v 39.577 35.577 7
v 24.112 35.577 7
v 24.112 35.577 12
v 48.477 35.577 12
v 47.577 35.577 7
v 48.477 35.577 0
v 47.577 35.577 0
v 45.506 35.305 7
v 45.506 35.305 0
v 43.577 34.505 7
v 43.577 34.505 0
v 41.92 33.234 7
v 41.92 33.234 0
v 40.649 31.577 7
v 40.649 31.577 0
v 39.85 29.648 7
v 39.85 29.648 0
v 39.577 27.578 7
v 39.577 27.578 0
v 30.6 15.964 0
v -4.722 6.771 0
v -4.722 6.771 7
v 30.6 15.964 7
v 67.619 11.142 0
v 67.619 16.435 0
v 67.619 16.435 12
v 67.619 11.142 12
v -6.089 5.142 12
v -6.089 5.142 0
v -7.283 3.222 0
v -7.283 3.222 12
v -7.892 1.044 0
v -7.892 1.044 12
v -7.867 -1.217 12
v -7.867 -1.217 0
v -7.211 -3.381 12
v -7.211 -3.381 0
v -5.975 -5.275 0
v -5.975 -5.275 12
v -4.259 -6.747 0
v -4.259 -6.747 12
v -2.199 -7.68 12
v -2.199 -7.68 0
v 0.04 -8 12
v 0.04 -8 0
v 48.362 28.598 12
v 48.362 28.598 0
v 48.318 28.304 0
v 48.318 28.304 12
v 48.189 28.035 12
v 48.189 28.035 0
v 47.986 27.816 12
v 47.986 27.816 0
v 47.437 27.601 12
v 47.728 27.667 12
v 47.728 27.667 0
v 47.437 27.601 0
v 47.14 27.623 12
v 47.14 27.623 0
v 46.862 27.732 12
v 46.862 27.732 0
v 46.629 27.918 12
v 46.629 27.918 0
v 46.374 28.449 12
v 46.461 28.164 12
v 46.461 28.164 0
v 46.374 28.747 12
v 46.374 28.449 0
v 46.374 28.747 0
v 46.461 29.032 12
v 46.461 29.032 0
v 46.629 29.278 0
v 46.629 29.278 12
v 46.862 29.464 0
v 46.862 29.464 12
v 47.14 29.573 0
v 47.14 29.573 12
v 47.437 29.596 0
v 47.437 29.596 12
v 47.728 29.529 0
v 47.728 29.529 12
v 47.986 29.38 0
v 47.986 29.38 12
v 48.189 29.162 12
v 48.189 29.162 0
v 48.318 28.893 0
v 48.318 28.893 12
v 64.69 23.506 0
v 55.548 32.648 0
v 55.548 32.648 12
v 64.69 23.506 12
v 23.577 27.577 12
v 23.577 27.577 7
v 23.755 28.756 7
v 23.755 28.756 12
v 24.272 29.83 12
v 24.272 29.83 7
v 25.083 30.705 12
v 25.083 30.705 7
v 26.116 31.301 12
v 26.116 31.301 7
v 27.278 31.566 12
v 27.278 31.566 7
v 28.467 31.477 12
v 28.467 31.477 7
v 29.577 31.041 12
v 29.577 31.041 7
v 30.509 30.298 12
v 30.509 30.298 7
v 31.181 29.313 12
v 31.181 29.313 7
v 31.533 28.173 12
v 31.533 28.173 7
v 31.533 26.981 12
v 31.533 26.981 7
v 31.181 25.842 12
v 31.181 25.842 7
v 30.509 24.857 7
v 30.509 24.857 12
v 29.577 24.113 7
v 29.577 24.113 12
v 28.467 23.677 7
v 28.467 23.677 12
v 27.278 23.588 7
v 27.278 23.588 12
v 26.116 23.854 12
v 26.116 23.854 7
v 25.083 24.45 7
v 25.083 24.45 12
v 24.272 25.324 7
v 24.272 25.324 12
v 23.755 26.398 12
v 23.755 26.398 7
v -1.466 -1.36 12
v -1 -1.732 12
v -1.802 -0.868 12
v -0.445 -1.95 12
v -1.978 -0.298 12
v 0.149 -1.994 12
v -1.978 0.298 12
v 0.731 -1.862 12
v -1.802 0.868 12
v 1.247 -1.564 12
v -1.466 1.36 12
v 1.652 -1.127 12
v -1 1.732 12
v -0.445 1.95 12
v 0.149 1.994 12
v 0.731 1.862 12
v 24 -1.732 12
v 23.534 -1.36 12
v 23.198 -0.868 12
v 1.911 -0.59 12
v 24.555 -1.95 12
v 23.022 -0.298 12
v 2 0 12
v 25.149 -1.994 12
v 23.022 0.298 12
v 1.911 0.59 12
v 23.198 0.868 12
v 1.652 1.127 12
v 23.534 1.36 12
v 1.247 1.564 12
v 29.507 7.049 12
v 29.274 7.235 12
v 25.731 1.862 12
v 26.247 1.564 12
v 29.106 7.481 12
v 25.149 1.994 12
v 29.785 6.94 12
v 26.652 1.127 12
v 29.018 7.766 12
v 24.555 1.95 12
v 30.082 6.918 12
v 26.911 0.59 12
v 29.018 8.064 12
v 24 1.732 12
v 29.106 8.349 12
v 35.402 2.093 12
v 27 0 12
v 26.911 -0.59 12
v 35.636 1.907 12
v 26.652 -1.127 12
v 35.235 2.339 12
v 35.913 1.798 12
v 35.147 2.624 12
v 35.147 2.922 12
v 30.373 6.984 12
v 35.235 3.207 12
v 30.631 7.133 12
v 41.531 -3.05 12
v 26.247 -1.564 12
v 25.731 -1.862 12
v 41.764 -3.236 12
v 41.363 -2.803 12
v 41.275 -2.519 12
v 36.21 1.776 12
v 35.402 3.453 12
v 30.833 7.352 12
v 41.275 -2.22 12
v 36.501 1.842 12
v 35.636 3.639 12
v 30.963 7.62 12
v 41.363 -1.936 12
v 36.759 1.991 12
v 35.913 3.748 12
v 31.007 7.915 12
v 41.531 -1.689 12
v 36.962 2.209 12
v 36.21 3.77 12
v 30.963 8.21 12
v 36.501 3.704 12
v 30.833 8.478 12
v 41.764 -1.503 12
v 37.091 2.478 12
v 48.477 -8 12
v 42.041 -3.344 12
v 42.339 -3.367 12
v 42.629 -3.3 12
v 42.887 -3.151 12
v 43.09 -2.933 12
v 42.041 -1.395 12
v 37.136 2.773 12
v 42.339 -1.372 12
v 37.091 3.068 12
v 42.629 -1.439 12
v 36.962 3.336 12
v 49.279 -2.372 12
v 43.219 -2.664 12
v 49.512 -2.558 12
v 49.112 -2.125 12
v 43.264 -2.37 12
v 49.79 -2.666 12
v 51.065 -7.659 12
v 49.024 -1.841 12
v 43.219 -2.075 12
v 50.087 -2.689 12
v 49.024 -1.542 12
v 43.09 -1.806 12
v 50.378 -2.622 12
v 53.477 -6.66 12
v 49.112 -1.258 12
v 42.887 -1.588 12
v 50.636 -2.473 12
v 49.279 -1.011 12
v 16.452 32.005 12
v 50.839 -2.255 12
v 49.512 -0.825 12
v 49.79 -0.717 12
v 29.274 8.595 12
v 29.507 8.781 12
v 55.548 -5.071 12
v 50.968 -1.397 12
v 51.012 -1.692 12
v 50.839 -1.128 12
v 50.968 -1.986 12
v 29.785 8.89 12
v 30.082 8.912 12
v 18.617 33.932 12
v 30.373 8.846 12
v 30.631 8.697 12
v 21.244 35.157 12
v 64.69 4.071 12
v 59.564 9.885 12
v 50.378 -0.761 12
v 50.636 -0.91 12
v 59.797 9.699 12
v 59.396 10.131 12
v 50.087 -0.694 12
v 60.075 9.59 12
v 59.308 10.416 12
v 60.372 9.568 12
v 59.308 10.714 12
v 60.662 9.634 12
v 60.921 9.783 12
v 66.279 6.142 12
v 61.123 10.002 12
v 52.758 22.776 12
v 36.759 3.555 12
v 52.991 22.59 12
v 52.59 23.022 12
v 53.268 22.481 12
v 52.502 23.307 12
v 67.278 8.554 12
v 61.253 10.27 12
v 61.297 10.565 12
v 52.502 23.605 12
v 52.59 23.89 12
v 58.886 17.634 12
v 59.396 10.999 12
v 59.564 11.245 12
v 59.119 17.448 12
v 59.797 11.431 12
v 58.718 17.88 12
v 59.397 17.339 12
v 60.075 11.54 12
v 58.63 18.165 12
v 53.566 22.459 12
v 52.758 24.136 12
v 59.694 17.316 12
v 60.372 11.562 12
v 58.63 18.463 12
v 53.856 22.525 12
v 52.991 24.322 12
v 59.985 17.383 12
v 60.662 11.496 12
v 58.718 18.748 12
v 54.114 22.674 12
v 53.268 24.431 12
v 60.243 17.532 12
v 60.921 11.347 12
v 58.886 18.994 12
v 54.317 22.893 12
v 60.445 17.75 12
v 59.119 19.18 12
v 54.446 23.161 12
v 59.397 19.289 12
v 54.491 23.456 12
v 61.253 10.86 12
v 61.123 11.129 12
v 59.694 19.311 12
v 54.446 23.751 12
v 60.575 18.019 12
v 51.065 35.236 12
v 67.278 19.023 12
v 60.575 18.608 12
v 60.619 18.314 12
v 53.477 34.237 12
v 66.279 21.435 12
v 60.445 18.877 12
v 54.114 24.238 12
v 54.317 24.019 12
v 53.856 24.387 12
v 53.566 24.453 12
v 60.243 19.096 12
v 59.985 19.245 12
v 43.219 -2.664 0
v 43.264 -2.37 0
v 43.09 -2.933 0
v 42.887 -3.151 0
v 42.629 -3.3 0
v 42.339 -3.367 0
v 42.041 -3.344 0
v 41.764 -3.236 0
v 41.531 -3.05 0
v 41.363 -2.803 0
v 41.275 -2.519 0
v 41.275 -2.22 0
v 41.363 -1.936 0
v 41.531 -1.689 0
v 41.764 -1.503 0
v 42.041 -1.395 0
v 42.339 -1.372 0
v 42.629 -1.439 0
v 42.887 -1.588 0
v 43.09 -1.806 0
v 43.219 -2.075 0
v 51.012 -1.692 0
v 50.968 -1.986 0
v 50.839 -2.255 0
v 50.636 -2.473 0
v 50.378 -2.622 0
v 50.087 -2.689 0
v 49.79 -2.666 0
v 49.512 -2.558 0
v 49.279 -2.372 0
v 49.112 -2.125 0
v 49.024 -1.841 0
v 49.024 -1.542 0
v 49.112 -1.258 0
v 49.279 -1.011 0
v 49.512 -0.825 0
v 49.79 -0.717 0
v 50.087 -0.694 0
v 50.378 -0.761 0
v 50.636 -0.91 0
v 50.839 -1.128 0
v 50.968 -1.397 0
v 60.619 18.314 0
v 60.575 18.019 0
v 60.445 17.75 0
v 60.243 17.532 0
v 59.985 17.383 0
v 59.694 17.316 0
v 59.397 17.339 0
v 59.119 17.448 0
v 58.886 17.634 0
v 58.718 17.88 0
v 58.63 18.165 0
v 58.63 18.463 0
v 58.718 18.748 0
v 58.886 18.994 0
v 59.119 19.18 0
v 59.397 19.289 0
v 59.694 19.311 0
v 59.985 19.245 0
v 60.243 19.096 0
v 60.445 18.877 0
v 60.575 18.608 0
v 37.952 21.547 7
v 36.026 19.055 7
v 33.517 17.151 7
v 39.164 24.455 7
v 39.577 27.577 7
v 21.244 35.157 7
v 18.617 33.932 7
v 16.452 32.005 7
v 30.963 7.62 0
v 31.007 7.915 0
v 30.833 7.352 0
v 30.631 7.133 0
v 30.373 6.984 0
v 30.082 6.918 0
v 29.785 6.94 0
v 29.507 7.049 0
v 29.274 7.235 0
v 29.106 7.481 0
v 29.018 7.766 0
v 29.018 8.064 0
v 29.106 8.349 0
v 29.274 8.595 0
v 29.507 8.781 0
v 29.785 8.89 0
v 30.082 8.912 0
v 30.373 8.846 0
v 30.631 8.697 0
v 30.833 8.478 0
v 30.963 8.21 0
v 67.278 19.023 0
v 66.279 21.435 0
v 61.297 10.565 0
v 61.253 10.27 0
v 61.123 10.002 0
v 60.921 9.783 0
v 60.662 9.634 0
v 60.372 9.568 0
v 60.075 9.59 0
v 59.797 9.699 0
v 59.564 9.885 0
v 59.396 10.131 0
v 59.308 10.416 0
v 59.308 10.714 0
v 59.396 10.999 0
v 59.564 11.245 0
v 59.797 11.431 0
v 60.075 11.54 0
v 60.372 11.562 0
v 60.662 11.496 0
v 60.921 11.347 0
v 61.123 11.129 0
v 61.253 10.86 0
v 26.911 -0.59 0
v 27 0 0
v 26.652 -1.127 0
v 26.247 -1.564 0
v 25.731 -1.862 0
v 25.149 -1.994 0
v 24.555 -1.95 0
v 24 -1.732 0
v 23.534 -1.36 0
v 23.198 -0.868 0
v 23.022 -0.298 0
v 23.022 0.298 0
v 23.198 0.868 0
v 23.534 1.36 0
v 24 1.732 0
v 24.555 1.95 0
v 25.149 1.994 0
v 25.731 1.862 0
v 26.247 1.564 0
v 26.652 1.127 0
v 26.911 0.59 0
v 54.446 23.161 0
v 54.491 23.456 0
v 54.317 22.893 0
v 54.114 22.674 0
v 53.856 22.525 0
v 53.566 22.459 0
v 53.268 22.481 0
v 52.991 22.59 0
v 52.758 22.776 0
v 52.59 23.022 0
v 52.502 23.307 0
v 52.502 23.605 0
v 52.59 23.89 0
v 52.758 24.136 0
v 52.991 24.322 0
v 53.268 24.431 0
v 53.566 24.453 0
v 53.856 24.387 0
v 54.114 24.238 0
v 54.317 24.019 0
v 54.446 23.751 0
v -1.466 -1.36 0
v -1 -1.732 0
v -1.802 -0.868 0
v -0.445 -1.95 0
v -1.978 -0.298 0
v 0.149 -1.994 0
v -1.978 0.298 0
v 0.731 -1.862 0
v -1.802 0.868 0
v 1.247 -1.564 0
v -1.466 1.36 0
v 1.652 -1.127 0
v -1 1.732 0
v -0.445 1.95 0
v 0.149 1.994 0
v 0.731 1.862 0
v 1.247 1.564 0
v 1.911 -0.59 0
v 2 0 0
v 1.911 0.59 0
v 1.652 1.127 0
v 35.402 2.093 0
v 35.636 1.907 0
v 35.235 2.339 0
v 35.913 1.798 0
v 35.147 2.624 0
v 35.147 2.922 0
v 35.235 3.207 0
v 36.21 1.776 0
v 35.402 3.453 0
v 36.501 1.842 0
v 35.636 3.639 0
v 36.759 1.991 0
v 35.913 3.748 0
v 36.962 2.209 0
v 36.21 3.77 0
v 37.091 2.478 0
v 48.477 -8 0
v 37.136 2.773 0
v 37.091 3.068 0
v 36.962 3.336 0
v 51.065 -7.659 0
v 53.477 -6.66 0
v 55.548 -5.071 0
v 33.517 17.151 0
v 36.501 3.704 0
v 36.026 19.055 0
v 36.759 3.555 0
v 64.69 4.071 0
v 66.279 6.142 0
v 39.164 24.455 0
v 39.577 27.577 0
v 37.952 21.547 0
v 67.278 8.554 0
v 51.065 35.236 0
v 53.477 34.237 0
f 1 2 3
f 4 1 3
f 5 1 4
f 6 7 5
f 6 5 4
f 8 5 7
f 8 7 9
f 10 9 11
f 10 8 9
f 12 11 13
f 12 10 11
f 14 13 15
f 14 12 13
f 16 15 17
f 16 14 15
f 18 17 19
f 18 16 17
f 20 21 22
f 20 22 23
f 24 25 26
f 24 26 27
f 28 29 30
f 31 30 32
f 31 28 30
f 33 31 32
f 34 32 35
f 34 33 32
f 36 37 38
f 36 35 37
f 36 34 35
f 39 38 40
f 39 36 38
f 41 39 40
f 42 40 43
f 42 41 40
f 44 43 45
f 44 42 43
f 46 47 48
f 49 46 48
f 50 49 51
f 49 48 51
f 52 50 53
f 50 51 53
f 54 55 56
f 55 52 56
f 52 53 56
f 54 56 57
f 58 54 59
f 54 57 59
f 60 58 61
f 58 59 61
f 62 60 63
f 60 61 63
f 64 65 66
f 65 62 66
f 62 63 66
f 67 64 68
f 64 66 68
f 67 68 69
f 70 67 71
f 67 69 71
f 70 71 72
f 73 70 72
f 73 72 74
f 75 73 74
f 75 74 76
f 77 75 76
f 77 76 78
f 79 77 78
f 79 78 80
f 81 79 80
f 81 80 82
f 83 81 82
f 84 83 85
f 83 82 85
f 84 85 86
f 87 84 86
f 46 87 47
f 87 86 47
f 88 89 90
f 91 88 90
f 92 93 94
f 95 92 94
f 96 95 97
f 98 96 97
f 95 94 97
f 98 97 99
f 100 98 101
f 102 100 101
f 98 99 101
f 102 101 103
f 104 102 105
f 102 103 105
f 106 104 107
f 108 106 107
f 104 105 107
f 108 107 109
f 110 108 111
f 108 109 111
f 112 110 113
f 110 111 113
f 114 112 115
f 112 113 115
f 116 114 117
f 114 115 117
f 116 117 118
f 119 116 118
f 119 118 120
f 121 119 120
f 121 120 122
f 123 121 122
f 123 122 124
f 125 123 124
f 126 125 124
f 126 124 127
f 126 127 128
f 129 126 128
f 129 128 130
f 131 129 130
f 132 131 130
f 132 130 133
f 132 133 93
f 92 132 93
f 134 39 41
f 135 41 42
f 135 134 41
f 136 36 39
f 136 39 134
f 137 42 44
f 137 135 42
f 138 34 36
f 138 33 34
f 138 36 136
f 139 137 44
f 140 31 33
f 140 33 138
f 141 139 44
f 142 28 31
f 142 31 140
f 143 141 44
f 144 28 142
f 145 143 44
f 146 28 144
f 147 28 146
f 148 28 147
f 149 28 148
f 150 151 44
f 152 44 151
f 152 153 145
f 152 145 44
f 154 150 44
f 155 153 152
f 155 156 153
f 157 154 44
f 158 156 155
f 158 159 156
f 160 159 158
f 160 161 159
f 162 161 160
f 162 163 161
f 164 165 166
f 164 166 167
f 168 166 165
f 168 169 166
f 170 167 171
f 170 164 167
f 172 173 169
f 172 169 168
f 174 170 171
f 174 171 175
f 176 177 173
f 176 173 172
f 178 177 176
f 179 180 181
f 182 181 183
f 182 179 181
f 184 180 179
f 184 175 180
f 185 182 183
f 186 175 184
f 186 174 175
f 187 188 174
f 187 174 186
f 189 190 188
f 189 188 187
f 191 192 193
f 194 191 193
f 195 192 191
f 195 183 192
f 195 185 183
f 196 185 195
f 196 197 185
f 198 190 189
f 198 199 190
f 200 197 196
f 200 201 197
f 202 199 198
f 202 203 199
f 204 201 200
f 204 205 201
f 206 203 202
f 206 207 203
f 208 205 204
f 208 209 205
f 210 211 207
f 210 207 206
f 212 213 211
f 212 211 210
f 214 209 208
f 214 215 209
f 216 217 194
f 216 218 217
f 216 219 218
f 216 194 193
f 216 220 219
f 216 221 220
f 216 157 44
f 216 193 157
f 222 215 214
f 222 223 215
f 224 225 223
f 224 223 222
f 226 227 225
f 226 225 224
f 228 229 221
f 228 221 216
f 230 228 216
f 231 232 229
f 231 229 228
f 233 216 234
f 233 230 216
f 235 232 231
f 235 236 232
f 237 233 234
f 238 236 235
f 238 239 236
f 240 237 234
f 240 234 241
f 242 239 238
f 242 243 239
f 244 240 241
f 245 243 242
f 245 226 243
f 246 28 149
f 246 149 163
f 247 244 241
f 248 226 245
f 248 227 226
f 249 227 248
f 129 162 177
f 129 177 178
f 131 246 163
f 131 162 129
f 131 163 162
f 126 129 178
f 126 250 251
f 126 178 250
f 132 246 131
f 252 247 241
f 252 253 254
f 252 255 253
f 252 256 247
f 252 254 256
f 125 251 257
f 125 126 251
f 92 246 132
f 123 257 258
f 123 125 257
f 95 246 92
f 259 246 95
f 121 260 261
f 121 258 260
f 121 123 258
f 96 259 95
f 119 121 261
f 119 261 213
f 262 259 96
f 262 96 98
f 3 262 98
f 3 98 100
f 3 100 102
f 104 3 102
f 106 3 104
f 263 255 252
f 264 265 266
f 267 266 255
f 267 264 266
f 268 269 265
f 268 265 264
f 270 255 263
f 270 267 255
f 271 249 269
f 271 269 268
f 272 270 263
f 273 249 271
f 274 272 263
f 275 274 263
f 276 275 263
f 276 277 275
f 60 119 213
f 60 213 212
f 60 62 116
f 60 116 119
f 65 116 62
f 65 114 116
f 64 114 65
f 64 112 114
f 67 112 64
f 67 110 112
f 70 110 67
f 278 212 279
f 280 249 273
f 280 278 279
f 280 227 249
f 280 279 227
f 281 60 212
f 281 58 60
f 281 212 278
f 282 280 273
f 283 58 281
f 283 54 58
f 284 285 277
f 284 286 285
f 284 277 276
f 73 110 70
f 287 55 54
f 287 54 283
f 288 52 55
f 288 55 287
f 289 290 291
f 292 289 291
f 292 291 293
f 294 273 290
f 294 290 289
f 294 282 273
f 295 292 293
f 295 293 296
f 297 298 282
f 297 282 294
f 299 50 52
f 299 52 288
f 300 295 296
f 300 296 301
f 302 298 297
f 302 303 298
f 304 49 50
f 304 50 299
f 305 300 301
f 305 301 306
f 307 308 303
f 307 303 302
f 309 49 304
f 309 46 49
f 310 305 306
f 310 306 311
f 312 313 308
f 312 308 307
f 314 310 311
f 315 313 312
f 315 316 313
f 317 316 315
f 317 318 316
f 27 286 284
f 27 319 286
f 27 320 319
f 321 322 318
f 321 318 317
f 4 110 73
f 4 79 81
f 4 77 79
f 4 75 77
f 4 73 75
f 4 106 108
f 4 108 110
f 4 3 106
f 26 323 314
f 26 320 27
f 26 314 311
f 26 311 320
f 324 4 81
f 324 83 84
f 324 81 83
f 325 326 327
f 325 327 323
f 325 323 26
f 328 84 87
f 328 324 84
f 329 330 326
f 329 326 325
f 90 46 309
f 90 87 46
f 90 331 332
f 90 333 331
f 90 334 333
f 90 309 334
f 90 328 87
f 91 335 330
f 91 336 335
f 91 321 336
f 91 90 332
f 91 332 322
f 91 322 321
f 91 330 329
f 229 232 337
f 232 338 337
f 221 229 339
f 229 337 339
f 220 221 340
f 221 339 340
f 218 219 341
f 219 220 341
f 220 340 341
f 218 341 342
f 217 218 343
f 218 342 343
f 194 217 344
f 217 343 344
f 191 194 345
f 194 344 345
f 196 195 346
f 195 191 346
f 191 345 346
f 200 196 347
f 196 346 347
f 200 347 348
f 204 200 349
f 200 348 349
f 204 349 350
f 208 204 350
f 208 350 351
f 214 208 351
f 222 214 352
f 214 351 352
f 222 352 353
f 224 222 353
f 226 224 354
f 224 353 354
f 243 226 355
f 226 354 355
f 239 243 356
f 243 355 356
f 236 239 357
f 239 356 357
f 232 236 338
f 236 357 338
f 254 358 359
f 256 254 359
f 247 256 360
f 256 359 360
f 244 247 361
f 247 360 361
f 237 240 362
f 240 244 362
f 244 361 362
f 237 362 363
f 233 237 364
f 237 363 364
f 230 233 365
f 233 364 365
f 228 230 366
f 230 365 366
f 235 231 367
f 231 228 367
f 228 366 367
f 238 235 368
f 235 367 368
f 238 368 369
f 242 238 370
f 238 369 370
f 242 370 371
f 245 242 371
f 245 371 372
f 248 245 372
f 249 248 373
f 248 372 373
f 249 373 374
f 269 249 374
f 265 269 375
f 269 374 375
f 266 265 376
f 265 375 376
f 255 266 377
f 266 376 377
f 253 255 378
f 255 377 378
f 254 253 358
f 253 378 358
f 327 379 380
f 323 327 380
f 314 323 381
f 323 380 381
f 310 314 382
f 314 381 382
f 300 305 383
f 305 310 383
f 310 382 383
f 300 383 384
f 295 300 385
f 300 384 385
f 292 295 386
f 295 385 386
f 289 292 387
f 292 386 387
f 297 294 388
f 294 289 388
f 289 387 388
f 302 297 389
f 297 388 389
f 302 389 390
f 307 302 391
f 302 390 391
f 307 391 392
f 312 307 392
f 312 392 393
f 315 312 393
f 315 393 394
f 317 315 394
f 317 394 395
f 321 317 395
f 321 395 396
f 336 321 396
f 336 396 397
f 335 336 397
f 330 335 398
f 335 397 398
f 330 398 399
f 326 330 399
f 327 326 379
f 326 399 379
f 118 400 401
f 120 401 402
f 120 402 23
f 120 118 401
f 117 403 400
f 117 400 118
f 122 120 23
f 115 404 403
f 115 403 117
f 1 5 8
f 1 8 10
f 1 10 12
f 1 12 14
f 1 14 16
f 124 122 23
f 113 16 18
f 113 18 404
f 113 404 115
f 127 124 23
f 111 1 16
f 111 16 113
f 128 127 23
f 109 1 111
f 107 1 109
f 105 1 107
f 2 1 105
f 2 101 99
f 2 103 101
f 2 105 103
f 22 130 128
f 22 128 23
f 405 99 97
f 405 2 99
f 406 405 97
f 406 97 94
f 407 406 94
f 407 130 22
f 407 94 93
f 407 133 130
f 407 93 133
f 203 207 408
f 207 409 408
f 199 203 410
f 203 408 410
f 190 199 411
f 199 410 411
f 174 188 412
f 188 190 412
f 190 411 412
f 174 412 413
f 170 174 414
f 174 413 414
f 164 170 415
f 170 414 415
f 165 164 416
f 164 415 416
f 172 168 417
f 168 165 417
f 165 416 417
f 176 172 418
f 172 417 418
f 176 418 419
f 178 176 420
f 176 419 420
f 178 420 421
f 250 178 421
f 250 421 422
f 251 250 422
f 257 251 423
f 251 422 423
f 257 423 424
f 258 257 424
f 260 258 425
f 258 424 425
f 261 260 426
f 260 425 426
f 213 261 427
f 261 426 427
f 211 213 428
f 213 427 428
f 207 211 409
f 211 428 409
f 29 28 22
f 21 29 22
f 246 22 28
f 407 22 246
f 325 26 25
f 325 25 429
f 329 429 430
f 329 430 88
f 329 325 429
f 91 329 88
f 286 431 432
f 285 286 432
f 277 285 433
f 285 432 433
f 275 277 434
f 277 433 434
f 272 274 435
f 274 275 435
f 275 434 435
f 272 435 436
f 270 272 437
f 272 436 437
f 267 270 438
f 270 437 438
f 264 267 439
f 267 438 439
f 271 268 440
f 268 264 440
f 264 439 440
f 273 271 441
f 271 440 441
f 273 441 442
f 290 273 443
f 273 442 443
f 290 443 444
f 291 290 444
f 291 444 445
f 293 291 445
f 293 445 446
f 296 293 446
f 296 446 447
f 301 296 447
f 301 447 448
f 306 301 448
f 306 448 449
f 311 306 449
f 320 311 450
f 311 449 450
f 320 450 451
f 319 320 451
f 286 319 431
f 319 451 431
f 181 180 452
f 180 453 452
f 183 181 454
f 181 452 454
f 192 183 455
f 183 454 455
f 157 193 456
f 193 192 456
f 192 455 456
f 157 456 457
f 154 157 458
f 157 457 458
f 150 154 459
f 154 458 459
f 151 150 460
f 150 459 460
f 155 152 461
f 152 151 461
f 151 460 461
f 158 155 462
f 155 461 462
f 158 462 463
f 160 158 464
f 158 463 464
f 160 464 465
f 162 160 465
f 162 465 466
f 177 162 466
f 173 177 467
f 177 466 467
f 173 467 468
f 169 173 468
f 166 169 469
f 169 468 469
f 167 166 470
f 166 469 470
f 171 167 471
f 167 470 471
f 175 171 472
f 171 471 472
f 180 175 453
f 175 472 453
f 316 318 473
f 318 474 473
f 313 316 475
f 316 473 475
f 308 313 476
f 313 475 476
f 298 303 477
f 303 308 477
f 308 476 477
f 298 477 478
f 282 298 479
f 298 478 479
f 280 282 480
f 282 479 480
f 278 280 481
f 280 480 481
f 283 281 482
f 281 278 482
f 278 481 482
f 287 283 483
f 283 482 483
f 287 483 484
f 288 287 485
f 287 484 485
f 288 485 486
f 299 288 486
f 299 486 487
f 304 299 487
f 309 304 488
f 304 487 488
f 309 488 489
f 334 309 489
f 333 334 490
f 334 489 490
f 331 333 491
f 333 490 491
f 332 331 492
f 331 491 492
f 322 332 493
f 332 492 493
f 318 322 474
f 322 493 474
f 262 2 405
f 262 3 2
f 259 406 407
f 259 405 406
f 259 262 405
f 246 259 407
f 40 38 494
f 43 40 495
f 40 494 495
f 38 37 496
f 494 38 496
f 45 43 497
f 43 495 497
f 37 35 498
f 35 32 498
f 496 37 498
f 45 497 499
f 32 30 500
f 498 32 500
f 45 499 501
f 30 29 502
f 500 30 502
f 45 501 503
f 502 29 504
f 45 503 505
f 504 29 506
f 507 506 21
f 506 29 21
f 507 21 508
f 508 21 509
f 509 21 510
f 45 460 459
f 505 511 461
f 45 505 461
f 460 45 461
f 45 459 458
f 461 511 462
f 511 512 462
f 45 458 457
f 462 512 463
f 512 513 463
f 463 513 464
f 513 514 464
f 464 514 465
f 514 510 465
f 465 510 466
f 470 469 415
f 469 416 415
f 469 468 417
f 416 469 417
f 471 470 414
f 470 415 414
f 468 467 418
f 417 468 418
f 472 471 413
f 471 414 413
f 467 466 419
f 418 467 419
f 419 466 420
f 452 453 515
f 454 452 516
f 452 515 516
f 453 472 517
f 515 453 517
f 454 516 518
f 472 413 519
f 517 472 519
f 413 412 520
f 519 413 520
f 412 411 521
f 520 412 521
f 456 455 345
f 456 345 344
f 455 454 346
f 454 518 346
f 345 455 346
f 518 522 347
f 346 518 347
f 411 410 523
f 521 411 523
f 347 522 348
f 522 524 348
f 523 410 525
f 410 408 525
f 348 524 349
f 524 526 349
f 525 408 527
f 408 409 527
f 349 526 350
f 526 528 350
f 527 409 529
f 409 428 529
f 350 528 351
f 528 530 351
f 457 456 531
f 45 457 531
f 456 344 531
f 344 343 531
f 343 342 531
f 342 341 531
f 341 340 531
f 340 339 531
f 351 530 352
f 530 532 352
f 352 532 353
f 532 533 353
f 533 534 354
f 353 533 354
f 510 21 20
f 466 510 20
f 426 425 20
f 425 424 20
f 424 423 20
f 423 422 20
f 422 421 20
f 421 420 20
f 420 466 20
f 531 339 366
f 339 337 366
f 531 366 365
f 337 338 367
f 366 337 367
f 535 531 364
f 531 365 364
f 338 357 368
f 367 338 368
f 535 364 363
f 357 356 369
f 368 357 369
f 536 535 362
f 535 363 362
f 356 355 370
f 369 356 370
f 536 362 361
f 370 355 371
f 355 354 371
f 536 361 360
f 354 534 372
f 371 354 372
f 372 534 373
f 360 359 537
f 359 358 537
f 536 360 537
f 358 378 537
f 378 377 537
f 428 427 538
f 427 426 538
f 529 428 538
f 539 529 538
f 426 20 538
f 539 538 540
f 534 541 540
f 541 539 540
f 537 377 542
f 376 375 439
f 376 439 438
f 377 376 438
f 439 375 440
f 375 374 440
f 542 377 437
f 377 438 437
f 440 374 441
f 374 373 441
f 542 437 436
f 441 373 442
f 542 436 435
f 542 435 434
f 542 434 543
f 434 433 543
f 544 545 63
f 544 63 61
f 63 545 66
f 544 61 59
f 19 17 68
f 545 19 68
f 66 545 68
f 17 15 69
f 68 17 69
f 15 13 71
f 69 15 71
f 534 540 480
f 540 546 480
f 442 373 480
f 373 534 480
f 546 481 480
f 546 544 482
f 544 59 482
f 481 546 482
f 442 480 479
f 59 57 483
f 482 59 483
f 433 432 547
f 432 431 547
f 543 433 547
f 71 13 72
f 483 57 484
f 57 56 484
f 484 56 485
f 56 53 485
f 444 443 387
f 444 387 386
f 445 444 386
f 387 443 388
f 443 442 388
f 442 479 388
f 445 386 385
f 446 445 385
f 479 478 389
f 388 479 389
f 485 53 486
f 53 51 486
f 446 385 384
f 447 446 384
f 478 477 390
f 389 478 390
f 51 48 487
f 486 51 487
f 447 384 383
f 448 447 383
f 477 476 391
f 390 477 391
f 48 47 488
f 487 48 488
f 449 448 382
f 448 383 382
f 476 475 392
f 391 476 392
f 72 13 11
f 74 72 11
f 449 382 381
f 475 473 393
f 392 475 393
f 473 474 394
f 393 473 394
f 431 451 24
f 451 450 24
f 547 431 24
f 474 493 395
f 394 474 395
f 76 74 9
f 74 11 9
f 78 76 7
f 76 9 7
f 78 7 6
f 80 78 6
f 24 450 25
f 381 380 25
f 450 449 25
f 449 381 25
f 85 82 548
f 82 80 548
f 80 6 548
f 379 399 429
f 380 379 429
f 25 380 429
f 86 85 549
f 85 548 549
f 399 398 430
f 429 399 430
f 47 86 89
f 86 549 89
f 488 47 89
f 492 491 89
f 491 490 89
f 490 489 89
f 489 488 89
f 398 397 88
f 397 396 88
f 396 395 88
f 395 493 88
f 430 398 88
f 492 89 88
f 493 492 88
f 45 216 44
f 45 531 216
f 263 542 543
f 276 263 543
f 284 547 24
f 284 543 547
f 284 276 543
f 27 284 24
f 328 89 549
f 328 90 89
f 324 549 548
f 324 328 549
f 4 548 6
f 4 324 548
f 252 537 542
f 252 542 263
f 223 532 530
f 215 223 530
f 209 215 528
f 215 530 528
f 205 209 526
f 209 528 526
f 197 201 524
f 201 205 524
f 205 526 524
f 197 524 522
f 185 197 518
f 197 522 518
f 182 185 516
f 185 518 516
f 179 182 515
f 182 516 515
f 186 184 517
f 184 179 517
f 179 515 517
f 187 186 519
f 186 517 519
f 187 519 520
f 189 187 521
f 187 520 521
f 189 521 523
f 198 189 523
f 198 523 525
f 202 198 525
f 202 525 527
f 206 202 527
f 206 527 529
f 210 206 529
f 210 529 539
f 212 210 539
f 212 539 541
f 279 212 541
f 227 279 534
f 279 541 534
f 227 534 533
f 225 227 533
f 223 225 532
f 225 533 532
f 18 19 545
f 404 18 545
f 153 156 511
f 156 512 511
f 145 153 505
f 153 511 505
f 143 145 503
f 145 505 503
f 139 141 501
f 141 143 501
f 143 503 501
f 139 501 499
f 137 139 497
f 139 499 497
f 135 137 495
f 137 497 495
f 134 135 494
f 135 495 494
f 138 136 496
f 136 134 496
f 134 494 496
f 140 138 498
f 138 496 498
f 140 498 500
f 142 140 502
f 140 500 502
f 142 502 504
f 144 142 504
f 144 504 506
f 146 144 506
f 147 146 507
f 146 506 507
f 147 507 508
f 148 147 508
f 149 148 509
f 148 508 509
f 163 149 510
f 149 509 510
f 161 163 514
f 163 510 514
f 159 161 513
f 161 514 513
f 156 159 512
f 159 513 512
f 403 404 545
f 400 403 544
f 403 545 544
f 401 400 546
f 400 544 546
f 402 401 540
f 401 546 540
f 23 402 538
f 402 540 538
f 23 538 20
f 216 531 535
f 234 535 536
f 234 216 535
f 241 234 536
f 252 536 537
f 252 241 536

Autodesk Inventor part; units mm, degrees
ref_plane "YZ Plane" through (0, 0, 0) normal (1, 0, 0) x (0, 1, 0)
ref_plane "XZ Plane" through (0, 0, 0) normal (0, 1, 0) x (-1, 0, 0)
ref_plane "XY Plane" through (0, 0, 0) normal (0, 0, 1) x (1, 0, 0)
sketch "Esquisse1" plane through (0, 0, 0) normal (0, 0, 1) x (1, 0, 0)
  circle A0 centre (0, 0) radius 2
  line L0 (0, 0) -> (46.5696, 0) construction
  line L1 (0, 0) -> (27.5772, 27.5772) construction
  circle A1 centre (27.5772, 27.5772) radius 2
  line L2 (27.5772, 27.5772) -> (55.1548, 4.4368) construction
  line L3 (27.5772, 27.5772) -> (45.4581, 27.5772) construction
  line L4 (0, 0) -> (0, -8) construction
  line L5 (0, 0) -> (-5.6569, 5.6569) construction
  line L6 (27.5772, 27.5772) -> (27.5772, 35.5772) construction
  line L7 (27.5772, 27.5772) -> (36.2548, 37.9188) construction
  line L8 (36.2548, 37.9188) -> (41.2341, 33.7406) construction
  line L9 (41.2341, 33.7406) -> (47.3624, 28.5983) construction
  line L10 (47.3624, 28.5983) -> (53.4908, 23.456) construction
  line L11 (53.4908, 23.456) -> (59.6192, 18.3137) construction
  line L12 (55.1548, 4.4368) -> (60.2971, 10.5652) construction
  circle A2 centre (41.2341, 33.7406) radius 1 construction
  circle A3 centre (47.3624, 28.5983) radius 1
  circle A4 centre (53.4908, 23.456) radius 1
  circle A5 centre (59.6192, 18.3137) radius 1
  circle A6 centre (60.2971, 10.5652) radius 1
  line L13 (59.6192, 18.3137) -> (67.6192, 18.3137) construction
  line L14 (67.6192, 35.5772) -> (67.6192, -8)
  line L15 (67.6192, -8) -> (-17.1163, -8)
  line L16 (-17.1163, -8) -> (19.4493, 35.5772)
  line L17 (19.4493, 35.5772) -> (67.6192, 35.5772)
  circle A7 centre (23.8788, 13.0574) radius 1 construction
  circle A8 centre (30.0072, 7.9151) radius 1
  circle A9 centre (36.1355, 2.7728) radius 1
  circle A10 centre (42.2639, -2.3695) radius 1
  circle A11 centre (50.0125, -1.6915) radius 1
  line L18 (0, 0) -> (25, 0) construction
  circle A12 centre (25, 0) radius 2
  dimension "d0" = 4
  dimension "d1" = 39
  dimension "d2" = 45
  dimension "d3" = 36
  dimension "d4" = 40
  dimension "d5" = 8
  dimension "d6" = 8
  dimension "d7" = 8
  dimension "d8" = 13.5
  dimension "d9" = 6.5
  dimension "d10" = 8
  dimension "d11" = 8
  dimension "d12" = 8
  dimension "d13" = 8
  dimension "d14" = 2
  dimension "d15" = 8
  dimension "d16" = 25
extrude "Extrusion1" add sketch "Esquisse1" along normal blind 12
sketch "Esquisse2" plane through (0, 0, 0) normal (0, 0, -1) x (-1, 0, 0)
  circle A0 centre (-27.5772, 27.5772) radius 2 projected
  circle A1 centre (0, 0) radius 2 projected
  line L0 (17.1163, -8) -> (-19.4493, 35.5772) projected
  line L1 (-19.4493, 35.5772) -> (-67.6192, 35.5772) projected
  circle A2 centre (-27.5772, 27.5772) radius 12 construction
  line L2 (-39.5772, 35.5772) -> (-39.5772, 27.5772)
  line L3 (4.7219, 6.771) -> (-30.5997, 15.964)
  arc A3 (-39.5772, 27.5772) -> (-30.5997, 15.964) centre (-27.5772, 27.5772) ccw
  line L4 (-67.6192, -8) -> (17.1163, -8) projected
  line L5 (0, 0) -> (0, 8) construction
  dimension "d19" = 24
  dimension "d42" = 8
extrude "Extrusion2" cut sketch "Esquisse2" against normal blind 7 contours L3 A3 L2 L1 L0
sketch "Esquisse3" plane through (0, 0, 7) normal (0, 0, -1) x (-1, 0, 0)
  circle A0 centre (-27.5772, 27.5772) radius 2 projected
  arc A1 (-39.5772, 27.5772) -> (-30.5997, 15.964) centre (-27.5772, 27.5772) ccw projected
  circle A2 centre (-27.5772, 27.5772) radius 4
  point P0 (0, 0)
  dimension "d24" = 8
extrude "Extrusion3" cut sketch "Esquisse3" against normal through all
fillet "Congé1" radius 8 1 edges at (-17.1163, -8, 6)
fillet "Congé2" radius 10 1 edges at (19.4493, 35.5772, 9.5)
fillet "Congé5" radius 8 1 edges at (39.5772, 35.5772, 3.5)
chamfer "Chanfrein1" distance 15 angle 45 1 edges at (67.6192, 35.5772, 6)
chamfer "Chanfrein2" distance 15 angle 45 1 edges at (67.6192, -8, 6)
fillet "Congé6" radius 10 1 edges at (67.6192, 20.5772, 6)
fillet "Congé7" radius 10 1 edges at (52.6192, 35.5772, 6)
fillet "Congé8" radius 10 1 edges at (67.6192, 7, 6)
fillet "Congé9" radius 10 1 edges at (52.6192, -8, 6)
properties part number "joint1left+ax12imprint_v3"
